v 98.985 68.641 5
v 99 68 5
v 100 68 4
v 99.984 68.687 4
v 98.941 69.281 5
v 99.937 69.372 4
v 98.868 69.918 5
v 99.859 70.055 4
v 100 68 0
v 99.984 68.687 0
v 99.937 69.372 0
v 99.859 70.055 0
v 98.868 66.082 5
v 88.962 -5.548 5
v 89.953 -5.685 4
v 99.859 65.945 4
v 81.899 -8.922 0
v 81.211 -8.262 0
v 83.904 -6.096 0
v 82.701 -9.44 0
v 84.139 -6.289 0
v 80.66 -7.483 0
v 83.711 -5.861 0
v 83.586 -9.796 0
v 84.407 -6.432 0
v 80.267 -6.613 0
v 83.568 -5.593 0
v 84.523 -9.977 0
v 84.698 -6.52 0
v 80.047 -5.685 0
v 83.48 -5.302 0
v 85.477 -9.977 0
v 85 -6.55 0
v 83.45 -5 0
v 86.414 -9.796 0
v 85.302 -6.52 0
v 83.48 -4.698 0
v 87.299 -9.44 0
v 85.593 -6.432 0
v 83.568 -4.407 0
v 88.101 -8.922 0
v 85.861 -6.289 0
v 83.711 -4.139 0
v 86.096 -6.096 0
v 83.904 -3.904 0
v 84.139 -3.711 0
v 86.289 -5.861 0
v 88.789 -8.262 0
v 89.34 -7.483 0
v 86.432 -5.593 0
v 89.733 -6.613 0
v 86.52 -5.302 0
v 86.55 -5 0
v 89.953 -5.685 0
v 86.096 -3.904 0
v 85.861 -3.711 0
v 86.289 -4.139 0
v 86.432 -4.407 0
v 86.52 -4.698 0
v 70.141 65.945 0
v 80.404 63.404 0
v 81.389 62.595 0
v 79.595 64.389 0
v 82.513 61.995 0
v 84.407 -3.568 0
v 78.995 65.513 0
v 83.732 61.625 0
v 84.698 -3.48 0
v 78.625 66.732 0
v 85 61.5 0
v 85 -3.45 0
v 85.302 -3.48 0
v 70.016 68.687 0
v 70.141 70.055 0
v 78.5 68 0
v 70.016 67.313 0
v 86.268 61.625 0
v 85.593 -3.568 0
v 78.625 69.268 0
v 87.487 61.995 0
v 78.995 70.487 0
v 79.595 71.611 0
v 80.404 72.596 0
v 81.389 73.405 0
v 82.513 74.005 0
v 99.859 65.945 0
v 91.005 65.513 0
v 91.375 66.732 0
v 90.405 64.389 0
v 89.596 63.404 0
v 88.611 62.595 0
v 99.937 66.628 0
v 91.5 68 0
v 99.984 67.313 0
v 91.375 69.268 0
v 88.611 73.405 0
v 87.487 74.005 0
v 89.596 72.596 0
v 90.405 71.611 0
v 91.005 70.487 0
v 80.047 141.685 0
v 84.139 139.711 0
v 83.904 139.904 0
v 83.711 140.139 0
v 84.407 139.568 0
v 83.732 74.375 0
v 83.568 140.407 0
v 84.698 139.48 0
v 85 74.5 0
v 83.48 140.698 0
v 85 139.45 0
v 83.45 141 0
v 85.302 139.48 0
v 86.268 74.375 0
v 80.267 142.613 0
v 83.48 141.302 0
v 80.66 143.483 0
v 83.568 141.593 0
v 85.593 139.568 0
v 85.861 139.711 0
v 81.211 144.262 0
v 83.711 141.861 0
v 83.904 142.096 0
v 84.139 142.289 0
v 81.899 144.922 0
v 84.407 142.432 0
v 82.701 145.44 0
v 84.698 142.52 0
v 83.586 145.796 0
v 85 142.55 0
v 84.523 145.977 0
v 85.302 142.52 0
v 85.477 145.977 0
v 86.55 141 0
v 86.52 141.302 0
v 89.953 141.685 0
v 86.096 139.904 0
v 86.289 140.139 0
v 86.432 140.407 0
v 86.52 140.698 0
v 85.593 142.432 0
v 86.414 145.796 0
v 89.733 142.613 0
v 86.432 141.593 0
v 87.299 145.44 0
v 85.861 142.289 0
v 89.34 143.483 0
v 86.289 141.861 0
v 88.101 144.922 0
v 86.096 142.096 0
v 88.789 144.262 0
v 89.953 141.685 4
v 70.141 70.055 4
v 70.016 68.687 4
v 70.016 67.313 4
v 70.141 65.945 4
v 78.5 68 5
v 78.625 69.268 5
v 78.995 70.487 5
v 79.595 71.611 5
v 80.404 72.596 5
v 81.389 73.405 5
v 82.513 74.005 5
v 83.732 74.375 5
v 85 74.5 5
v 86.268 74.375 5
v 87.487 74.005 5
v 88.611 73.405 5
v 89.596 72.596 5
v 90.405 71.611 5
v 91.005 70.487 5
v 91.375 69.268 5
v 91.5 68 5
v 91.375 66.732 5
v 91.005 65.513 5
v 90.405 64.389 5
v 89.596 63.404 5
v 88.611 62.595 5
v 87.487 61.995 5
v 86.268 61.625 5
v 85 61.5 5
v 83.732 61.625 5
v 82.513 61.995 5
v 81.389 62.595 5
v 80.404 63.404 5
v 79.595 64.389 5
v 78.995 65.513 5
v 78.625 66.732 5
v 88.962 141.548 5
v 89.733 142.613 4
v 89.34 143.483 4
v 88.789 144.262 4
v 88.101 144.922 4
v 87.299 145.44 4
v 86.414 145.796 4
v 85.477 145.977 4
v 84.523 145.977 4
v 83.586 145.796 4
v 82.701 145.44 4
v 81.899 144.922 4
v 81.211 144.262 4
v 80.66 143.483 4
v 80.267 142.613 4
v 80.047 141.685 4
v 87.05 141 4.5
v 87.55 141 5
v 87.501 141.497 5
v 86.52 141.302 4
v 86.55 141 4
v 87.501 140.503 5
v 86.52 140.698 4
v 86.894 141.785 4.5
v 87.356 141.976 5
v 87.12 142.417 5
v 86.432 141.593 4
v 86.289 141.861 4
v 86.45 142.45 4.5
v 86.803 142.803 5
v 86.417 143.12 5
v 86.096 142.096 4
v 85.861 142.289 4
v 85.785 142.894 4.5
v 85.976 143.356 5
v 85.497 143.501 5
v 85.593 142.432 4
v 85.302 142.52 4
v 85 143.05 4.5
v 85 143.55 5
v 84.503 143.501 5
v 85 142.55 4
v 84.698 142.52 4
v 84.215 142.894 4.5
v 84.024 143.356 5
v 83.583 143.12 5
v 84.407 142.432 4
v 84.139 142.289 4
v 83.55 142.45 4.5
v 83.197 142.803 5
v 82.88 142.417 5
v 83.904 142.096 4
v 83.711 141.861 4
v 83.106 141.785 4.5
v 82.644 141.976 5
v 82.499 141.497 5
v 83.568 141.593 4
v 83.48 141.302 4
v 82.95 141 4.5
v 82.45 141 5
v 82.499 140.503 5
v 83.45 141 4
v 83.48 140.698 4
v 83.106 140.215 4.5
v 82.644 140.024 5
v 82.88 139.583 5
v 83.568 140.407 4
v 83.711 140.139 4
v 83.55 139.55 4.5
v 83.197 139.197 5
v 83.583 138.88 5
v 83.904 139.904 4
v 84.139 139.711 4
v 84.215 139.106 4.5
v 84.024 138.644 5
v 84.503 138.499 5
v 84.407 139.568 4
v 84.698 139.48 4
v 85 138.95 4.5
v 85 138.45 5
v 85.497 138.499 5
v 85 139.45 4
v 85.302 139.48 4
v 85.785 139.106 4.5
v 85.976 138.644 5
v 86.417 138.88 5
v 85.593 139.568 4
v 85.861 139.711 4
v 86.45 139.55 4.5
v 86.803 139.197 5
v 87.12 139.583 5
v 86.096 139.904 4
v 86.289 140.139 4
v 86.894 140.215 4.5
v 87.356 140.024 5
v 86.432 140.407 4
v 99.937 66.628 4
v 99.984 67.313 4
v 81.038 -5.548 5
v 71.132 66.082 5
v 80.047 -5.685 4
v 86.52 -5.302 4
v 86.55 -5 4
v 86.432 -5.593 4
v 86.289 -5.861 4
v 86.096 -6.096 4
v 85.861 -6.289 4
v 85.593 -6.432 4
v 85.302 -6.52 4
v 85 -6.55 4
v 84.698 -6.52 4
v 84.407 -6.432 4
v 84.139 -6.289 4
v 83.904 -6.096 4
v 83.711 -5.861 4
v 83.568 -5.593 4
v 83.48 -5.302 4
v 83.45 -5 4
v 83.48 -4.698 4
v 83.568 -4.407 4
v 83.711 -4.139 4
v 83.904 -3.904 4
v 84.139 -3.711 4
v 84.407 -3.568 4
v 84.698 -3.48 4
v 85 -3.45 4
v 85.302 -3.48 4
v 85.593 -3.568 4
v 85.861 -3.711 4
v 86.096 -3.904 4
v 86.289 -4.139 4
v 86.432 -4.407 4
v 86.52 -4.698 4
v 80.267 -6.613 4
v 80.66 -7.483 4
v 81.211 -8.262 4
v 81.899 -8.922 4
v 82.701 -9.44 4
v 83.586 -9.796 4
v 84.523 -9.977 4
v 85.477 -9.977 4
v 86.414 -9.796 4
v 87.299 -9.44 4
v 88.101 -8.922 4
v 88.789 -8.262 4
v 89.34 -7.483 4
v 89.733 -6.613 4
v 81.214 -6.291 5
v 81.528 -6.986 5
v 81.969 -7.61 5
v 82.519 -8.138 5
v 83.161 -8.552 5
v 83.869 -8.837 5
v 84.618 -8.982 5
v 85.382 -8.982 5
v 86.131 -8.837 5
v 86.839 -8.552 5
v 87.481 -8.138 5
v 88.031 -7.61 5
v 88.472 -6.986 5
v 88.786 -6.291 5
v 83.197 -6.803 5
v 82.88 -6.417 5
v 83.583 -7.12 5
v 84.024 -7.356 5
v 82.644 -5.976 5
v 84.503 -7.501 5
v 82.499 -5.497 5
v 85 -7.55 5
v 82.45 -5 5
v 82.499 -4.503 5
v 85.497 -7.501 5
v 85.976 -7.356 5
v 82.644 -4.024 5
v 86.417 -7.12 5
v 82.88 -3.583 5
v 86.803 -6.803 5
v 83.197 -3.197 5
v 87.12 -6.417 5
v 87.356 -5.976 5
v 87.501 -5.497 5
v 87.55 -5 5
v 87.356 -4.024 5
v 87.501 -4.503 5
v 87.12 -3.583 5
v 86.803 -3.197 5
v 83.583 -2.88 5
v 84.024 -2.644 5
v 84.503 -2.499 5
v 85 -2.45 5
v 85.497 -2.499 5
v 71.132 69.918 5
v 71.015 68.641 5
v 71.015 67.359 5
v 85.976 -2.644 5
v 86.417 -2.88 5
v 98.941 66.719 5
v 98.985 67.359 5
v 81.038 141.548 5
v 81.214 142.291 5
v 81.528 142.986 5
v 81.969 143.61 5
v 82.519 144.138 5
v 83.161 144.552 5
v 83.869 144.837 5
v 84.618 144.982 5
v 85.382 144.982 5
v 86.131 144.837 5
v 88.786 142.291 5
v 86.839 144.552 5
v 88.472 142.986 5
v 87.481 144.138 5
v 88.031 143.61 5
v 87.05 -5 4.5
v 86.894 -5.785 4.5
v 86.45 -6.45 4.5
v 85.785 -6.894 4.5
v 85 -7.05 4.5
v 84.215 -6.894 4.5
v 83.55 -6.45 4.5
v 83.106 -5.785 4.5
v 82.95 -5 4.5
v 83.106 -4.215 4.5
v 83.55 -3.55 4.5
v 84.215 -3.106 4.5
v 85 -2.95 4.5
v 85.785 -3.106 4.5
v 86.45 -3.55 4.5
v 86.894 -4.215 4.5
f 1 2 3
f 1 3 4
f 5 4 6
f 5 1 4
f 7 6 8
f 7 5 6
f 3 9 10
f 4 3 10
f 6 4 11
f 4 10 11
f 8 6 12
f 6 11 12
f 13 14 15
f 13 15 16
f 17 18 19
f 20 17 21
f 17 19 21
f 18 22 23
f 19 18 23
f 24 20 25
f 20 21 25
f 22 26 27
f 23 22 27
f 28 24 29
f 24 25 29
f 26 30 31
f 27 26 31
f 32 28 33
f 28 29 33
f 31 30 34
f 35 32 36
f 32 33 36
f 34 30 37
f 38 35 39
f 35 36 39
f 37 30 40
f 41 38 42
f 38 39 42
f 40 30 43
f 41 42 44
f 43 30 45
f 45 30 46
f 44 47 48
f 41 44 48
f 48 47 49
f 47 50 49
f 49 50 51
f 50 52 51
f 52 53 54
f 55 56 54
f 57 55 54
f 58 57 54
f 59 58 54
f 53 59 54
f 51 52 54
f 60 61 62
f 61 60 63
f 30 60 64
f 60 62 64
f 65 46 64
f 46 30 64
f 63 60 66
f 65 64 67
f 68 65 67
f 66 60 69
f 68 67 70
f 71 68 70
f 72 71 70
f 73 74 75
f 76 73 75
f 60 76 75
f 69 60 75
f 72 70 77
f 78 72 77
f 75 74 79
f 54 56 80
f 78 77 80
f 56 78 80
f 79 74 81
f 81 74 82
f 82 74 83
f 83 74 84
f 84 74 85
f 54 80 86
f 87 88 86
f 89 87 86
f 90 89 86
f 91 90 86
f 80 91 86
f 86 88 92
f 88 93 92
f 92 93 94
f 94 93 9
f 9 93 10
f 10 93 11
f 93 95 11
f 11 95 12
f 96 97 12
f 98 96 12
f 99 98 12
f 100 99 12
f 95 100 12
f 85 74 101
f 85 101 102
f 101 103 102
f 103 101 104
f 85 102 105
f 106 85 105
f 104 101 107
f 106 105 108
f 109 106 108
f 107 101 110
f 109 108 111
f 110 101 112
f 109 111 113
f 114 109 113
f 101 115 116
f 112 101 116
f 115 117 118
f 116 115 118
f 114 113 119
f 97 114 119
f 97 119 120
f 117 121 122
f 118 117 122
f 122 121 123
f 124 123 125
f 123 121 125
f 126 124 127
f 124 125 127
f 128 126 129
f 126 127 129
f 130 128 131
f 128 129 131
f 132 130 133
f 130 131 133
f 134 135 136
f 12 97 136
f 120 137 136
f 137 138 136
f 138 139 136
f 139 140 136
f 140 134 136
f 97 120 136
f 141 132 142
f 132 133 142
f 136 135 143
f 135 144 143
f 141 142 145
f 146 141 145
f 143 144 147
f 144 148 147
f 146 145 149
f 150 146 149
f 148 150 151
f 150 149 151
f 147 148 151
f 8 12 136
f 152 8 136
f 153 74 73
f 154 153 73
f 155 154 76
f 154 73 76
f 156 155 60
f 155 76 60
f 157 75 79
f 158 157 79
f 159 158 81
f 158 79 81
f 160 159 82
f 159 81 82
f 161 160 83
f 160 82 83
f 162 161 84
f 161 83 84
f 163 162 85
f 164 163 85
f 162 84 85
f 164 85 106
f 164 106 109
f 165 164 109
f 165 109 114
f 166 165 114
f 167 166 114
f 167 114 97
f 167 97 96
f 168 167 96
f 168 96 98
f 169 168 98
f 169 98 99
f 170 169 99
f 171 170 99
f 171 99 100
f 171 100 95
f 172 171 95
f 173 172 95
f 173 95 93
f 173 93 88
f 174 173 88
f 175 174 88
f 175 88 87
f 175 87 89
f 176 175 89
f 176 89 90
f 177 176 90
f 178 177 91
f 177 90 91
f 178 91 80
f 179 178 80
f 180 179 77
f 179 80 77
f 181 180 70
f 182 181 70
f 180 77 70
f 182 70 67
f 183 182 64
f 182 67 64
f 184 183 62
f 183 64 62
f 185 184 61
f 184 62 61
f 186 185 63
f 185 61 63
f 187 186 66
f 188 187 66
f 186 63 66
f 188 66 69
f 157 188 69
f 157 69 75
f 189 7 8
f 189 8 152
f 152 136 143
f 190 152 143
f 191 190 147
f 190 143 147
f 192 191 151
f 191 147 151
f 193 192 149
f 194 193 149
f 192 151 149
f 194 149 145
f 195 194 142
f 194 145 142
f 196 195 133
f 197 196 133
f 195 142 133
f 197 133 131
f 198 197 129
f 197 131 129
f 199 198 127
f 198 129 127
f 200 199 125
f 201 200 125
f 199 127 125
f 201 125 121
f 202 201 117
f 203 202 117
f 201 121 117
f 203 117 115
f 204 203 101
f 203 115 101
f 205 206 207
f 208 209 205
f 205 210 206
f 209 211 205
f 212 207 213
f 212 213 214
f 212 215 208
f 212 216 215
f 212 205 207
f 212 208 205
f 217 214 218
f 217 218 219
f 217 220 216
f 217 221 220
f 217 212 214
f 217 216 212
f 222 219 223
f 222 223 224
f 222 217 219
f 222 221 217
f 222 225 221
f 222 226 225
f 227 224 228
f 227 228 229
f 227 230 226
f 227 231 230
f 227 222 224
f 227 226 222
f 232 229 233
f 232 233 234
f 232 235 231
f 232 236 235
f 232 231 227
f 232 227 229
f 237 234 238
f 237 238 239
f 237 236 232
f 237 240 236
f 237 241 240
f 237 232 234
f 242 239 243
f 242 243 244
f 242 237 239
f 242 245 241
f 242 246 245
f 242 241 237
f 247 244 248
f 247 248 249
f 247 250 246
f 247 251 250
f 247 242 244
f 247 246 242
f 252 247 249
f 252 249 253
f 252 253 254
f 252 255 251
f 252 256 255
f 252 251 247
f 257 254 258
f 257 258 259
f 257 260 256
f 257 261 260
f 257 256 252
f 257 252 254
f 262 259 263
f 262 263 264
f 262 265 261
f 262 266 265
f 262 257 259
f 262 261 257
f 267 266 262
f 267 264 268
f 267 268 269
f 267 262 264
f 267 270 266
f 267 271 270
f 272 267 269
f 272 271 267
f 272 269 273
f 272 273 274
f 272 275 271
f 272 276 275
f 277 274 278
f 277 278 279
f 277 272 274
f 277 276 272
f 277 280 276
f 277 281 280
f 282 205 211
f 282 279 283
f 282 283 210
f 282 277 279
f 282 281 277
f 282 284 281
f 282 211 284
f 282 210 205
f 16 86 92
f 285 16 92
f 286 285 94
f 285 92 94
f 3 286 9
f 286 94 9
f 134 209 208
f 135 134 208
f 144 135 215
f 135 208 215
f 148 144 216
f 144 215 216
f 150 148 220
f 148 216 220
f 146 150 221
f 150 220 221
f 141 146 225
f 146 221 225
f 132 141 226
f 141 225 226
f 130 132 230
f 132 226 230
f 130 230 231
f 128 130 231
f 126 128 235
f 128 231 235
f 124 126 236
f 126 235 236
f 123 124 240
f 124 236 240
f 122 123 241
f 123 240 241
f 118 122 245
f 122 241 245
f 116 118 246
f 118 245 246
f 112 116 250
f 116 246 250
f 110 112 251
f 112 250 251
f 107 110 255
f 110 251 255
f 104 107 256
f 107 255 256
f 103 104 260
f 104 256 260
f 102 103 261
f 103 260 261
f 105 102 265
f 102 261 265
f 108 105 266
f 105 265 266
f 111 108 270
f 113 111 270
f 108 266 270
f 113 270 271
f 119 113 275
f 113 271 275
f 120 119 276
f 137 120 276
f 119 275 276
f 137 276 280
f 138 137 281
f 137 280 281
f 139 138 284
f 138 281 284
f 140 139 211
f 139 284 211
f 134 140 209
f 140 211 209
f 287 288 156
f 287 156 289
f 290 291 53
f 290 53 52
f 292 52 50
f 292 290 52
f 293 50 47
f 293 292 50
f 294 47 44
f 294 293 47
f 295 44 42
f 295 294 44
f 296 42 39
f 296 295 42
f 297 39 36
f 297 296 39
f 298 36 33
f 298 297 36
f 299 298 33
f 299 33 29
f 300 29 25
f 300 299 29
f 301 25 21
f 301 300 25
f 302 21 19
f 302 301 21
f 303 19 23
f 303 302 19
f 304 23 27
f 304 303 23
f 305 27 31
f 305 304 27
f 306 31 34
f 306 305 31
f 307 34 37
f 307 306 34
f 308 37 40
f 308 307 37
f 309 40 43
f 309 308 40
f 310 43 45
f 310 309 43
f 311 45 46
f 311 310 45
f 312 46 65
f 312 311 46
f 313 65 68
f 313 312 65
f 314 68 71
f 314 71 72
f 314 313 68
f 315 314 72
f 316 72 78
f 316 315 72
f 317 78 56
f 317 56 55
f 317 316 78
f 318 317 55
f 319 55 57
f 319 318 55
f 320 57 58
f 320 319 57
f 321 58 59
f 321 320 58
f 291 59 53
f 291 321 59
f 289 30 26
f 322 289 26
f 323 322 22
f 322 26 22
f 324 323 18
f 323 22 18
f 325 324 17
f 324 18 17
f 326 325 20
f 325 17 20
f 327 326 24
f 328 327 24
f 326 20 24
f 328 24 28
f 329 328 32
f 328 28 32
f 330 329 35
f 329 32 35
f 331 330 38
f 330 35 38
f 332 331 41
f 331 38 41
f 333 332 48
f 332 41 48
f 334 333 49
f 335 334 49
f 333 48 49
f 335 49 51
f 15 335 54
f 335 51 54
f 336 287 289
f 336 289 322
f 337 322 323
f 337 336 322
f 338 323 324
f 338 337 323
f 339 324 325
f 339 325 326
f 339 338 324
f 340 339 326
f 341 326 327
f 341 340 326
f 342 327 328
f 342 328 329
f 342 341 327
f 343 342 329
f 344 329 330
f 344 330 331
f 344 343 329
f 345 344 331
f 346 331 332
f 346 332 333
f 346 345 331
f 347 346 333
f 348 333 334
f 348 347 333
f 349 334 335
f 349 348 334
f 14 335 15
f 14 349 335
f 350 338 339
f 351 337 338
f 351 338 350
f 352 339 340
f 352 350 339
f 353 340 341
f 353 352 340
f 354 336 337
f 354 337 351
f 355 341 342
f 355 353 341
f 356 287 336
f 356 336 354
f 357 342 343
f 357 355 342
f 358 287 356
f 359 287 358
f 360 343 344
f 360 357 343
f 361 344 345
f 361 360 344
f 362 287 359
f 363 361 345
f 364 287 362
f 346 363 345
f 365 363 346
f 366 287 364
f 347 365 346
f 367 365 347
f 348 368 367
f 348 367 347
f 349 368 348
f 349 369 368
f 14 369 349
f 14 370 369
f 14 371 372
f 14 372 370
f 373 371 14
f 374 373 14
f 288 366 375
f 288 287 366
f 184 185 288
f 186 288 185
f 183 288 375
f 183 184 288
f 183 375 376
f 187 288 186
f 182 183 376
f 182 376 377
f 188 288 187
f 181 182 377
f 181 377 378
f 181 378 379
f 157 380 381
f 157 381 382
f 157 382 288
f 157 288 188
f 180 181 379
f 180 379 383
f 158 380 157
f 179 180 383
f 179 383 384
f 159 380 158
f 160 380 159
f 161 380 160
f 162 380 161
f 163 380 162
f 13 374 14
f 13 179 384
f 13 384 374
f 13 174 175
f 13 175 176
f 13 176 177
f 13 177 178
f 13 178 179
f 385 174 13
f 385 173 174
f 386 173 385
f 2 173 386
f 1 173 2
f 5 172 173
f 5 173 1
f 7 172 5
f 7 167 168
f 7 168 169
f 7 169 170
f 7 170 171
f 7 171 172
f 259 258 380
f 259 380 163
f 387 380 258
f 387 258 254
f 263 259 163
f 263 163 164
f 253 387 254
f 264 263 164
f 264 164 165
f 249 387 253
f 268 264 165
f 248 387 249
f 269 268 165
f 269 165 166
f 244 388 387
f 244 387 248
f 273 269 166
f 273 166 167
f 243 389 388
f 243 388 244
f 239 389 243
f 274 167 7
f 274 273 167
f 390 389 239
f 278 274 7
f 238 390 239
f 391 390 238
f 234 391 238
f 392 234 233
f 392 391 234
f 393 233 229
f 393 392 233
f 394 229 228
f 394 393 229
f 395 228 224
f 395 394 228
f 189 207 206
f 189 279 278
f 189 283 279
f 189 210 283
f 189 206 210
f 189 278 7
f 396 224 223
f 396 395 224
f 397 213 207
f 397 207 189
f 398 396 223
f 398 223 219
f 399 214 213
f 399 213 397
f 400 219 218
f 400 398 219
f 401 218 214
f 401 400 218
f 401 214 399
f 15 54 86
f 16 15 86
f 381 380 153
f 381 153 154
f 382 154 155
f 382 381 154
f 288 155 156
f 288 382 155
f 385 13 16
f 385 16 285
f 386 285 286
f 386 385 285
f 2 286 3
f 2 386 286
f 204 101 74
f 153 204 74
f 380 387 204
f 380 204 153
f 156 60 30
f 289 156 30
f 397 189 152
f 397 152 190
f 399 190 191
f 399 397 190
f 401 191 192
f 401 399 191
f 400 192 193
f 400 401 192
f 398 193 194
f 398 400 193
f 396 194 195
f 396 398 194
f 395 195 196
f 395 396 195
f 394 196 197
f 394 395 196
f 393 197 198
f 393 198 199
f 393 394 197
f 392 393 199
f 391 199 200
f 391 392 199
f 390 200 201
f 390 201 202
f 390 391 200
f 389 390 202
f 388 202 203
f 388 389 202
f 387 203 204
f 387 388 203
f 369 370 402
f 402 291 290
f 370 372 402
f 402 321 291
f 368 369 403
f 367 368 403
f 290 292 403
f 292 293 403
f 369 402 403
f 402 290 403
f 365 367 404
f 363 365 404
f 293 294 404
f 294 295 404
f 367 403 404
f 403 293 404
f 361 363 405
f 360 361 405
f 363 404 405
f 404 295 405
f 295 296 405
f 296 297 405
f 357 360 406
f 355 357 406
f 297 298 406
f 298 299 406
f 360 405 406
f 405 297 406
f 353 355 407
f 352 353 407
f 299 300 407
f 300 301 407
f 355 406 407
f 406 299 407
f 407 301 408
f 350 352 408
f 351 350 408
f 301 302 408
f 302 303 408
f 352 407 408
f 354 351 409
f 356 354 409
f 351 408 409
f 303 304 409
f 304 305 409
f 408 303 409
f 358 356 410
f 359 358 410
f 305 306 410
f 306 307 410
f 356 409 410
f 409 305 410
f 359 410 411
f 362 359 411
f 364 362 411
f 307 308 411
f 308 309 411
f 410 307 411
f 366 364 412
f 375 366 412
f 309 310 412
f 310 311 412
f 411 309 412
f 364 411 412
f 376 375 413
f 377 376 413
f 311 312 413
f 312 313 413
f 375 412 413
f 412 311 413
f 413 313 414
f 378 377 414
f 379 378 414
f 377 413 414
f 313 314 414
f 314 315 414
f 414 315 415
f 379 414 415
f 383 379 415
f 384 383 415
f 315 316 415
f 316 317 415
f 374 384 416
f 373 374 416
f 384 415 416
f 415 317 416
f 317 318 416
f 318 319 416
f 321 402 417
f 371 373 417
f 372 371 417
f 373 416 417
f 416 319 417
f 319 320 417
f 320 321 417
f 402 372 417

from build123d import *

# Parameters (mm, degrees)
BOSS_EXTRUDE1_DEPTH      = 5
CHAMFER1_SIZE            = 1
CUT_EXTRUDE2_REACH       = 179.034
SKETCH6_R                = 1.55
CHAMFER3_SIZE            = 1
CHAMFER3_OF_MIRROR2_SIZE = 1
CUT_EXTRUDE3_REACH       = 179.034
SKETCH10_R               = 6.5


with BuildPart() as part:
    # Sketch1 → Boss-Extrude1 (new body)
    with BuildSketch(Plane.XY):
        with BuildLine():
            ThreePointArc((99.858594129, 65.945205479), (100, 68), (99.858594129, 70.054794521))
            Line((99.858594129, 70.054794521), (89.95286471, 141.684931507))
            ThreePointArc((89.95286471, 141.684931507), (85, 146), (80.04713529, 141.684931507))
            Line((80.04713529, 141.684931507), (70.141405871, 70.054794521))
            ThreePointArc((70.141405871, 70.054794521), (70, 68), (70.141405871, 65.945205479))
            Line((70.141405871, 65.945205479), (80.04713529, -5.684931507))
            ThreePointArc((80.04713529, -5.684931507), (85, -10), (89.95286471, -5.684931507))
            Line((89.95286471, -5.684931507), (99.858594129, 65.945205479))
        make_face()
    extrude(amount=BOSS_EXTRUDE1_DEPTH)

    # Chamfer1
    chamfer1_edges = [part.edges().sort_by_distance(p)[0] for p in [
        (75.094270581, 30.130136986, 5),
        (70, 68, 5),
        (75.094270581, 105.869863014, 5),
        (85, 146, 5),
        (94.905729419, 105.869863014, 5),
        (100, 68, 5),
        (94.905729419, 30.130136986, 5),
        (85, -10, 5),
    ]]
    chamfer(chamfer1_edges, length=CHAMFER1_SIZE)

    # Sketch6 → Cut-Extrude2 (cut, up to next)
    with BuildSketch(Plane.XY.offset(5), mode=Mode.PRIVATE) as cut_extrude2_sk1:
        with Locations((85, 141)):
            Circle(SKETCH6_R)
    cut_extrude2_tool1 = extrude(cut_extrude2_sk1.sketch, amount=-CUT_EXTRUDE2_REACH, mode=Mode.PRIVATE) & part.part
    cut_extrude2 = cut_extrude2_tool1.solids().sort_by_distance((85, 141, 5))[0]
    add(cut_extrude2, mode=Mode.SUBTRACT)

    # Chamfer3
    chamfer3_edges = [part.edges().sort_by_distance(p)[0] for p in [
        (83.45, 141, 5),
    ]]
    chamfer(chamfer3_edges, length=CHAMFER3_SIZE)

    # Mirror2: Cut-Extrude2 across plane
    add(cut_extrude2.mirror(Plane(origin=(0, 68, 0), x_dir=(0, 0, 1), z_dir=(0, -1, 0))), mode=Mode.SUBTRACT)

    # Chamfer3 of Mirror2
    chamfer3_of_mirror2_edges = [part.edges().sort_by_distance(p)[0] for p in [
        (83.45, -5, 5),
    ]]
    chamfer(chamfer3_of_mirror2_edges, length=CHAMFER3_OF_MIRROR2_SIZE)

    # Sketch10 → Cut-Extrude3 (cut, up to next)
    with BuildSketch(Plane(origin=(0, 0, 0), x_dir=(-1, 0, 0), z_dir=(0, 0, -1)), mode=Mode.PRIVATE) as cut_extrude3_sk1:
        with Locations((-85, 68)):
            Circle(SKETCH10_R)
    cut_extrude3_tool1 = extrude(cut_extrude3_sk1.sketch, amount=-CUT_EXTRUDE3_REACH, mode=Mode.PRIVATE) & part.part
    add(cut_extrude3_tool1.solids().sort_by_distance((85, 68, 0))[0], mode=Mode.SUBTRACT)


solid = part.part
